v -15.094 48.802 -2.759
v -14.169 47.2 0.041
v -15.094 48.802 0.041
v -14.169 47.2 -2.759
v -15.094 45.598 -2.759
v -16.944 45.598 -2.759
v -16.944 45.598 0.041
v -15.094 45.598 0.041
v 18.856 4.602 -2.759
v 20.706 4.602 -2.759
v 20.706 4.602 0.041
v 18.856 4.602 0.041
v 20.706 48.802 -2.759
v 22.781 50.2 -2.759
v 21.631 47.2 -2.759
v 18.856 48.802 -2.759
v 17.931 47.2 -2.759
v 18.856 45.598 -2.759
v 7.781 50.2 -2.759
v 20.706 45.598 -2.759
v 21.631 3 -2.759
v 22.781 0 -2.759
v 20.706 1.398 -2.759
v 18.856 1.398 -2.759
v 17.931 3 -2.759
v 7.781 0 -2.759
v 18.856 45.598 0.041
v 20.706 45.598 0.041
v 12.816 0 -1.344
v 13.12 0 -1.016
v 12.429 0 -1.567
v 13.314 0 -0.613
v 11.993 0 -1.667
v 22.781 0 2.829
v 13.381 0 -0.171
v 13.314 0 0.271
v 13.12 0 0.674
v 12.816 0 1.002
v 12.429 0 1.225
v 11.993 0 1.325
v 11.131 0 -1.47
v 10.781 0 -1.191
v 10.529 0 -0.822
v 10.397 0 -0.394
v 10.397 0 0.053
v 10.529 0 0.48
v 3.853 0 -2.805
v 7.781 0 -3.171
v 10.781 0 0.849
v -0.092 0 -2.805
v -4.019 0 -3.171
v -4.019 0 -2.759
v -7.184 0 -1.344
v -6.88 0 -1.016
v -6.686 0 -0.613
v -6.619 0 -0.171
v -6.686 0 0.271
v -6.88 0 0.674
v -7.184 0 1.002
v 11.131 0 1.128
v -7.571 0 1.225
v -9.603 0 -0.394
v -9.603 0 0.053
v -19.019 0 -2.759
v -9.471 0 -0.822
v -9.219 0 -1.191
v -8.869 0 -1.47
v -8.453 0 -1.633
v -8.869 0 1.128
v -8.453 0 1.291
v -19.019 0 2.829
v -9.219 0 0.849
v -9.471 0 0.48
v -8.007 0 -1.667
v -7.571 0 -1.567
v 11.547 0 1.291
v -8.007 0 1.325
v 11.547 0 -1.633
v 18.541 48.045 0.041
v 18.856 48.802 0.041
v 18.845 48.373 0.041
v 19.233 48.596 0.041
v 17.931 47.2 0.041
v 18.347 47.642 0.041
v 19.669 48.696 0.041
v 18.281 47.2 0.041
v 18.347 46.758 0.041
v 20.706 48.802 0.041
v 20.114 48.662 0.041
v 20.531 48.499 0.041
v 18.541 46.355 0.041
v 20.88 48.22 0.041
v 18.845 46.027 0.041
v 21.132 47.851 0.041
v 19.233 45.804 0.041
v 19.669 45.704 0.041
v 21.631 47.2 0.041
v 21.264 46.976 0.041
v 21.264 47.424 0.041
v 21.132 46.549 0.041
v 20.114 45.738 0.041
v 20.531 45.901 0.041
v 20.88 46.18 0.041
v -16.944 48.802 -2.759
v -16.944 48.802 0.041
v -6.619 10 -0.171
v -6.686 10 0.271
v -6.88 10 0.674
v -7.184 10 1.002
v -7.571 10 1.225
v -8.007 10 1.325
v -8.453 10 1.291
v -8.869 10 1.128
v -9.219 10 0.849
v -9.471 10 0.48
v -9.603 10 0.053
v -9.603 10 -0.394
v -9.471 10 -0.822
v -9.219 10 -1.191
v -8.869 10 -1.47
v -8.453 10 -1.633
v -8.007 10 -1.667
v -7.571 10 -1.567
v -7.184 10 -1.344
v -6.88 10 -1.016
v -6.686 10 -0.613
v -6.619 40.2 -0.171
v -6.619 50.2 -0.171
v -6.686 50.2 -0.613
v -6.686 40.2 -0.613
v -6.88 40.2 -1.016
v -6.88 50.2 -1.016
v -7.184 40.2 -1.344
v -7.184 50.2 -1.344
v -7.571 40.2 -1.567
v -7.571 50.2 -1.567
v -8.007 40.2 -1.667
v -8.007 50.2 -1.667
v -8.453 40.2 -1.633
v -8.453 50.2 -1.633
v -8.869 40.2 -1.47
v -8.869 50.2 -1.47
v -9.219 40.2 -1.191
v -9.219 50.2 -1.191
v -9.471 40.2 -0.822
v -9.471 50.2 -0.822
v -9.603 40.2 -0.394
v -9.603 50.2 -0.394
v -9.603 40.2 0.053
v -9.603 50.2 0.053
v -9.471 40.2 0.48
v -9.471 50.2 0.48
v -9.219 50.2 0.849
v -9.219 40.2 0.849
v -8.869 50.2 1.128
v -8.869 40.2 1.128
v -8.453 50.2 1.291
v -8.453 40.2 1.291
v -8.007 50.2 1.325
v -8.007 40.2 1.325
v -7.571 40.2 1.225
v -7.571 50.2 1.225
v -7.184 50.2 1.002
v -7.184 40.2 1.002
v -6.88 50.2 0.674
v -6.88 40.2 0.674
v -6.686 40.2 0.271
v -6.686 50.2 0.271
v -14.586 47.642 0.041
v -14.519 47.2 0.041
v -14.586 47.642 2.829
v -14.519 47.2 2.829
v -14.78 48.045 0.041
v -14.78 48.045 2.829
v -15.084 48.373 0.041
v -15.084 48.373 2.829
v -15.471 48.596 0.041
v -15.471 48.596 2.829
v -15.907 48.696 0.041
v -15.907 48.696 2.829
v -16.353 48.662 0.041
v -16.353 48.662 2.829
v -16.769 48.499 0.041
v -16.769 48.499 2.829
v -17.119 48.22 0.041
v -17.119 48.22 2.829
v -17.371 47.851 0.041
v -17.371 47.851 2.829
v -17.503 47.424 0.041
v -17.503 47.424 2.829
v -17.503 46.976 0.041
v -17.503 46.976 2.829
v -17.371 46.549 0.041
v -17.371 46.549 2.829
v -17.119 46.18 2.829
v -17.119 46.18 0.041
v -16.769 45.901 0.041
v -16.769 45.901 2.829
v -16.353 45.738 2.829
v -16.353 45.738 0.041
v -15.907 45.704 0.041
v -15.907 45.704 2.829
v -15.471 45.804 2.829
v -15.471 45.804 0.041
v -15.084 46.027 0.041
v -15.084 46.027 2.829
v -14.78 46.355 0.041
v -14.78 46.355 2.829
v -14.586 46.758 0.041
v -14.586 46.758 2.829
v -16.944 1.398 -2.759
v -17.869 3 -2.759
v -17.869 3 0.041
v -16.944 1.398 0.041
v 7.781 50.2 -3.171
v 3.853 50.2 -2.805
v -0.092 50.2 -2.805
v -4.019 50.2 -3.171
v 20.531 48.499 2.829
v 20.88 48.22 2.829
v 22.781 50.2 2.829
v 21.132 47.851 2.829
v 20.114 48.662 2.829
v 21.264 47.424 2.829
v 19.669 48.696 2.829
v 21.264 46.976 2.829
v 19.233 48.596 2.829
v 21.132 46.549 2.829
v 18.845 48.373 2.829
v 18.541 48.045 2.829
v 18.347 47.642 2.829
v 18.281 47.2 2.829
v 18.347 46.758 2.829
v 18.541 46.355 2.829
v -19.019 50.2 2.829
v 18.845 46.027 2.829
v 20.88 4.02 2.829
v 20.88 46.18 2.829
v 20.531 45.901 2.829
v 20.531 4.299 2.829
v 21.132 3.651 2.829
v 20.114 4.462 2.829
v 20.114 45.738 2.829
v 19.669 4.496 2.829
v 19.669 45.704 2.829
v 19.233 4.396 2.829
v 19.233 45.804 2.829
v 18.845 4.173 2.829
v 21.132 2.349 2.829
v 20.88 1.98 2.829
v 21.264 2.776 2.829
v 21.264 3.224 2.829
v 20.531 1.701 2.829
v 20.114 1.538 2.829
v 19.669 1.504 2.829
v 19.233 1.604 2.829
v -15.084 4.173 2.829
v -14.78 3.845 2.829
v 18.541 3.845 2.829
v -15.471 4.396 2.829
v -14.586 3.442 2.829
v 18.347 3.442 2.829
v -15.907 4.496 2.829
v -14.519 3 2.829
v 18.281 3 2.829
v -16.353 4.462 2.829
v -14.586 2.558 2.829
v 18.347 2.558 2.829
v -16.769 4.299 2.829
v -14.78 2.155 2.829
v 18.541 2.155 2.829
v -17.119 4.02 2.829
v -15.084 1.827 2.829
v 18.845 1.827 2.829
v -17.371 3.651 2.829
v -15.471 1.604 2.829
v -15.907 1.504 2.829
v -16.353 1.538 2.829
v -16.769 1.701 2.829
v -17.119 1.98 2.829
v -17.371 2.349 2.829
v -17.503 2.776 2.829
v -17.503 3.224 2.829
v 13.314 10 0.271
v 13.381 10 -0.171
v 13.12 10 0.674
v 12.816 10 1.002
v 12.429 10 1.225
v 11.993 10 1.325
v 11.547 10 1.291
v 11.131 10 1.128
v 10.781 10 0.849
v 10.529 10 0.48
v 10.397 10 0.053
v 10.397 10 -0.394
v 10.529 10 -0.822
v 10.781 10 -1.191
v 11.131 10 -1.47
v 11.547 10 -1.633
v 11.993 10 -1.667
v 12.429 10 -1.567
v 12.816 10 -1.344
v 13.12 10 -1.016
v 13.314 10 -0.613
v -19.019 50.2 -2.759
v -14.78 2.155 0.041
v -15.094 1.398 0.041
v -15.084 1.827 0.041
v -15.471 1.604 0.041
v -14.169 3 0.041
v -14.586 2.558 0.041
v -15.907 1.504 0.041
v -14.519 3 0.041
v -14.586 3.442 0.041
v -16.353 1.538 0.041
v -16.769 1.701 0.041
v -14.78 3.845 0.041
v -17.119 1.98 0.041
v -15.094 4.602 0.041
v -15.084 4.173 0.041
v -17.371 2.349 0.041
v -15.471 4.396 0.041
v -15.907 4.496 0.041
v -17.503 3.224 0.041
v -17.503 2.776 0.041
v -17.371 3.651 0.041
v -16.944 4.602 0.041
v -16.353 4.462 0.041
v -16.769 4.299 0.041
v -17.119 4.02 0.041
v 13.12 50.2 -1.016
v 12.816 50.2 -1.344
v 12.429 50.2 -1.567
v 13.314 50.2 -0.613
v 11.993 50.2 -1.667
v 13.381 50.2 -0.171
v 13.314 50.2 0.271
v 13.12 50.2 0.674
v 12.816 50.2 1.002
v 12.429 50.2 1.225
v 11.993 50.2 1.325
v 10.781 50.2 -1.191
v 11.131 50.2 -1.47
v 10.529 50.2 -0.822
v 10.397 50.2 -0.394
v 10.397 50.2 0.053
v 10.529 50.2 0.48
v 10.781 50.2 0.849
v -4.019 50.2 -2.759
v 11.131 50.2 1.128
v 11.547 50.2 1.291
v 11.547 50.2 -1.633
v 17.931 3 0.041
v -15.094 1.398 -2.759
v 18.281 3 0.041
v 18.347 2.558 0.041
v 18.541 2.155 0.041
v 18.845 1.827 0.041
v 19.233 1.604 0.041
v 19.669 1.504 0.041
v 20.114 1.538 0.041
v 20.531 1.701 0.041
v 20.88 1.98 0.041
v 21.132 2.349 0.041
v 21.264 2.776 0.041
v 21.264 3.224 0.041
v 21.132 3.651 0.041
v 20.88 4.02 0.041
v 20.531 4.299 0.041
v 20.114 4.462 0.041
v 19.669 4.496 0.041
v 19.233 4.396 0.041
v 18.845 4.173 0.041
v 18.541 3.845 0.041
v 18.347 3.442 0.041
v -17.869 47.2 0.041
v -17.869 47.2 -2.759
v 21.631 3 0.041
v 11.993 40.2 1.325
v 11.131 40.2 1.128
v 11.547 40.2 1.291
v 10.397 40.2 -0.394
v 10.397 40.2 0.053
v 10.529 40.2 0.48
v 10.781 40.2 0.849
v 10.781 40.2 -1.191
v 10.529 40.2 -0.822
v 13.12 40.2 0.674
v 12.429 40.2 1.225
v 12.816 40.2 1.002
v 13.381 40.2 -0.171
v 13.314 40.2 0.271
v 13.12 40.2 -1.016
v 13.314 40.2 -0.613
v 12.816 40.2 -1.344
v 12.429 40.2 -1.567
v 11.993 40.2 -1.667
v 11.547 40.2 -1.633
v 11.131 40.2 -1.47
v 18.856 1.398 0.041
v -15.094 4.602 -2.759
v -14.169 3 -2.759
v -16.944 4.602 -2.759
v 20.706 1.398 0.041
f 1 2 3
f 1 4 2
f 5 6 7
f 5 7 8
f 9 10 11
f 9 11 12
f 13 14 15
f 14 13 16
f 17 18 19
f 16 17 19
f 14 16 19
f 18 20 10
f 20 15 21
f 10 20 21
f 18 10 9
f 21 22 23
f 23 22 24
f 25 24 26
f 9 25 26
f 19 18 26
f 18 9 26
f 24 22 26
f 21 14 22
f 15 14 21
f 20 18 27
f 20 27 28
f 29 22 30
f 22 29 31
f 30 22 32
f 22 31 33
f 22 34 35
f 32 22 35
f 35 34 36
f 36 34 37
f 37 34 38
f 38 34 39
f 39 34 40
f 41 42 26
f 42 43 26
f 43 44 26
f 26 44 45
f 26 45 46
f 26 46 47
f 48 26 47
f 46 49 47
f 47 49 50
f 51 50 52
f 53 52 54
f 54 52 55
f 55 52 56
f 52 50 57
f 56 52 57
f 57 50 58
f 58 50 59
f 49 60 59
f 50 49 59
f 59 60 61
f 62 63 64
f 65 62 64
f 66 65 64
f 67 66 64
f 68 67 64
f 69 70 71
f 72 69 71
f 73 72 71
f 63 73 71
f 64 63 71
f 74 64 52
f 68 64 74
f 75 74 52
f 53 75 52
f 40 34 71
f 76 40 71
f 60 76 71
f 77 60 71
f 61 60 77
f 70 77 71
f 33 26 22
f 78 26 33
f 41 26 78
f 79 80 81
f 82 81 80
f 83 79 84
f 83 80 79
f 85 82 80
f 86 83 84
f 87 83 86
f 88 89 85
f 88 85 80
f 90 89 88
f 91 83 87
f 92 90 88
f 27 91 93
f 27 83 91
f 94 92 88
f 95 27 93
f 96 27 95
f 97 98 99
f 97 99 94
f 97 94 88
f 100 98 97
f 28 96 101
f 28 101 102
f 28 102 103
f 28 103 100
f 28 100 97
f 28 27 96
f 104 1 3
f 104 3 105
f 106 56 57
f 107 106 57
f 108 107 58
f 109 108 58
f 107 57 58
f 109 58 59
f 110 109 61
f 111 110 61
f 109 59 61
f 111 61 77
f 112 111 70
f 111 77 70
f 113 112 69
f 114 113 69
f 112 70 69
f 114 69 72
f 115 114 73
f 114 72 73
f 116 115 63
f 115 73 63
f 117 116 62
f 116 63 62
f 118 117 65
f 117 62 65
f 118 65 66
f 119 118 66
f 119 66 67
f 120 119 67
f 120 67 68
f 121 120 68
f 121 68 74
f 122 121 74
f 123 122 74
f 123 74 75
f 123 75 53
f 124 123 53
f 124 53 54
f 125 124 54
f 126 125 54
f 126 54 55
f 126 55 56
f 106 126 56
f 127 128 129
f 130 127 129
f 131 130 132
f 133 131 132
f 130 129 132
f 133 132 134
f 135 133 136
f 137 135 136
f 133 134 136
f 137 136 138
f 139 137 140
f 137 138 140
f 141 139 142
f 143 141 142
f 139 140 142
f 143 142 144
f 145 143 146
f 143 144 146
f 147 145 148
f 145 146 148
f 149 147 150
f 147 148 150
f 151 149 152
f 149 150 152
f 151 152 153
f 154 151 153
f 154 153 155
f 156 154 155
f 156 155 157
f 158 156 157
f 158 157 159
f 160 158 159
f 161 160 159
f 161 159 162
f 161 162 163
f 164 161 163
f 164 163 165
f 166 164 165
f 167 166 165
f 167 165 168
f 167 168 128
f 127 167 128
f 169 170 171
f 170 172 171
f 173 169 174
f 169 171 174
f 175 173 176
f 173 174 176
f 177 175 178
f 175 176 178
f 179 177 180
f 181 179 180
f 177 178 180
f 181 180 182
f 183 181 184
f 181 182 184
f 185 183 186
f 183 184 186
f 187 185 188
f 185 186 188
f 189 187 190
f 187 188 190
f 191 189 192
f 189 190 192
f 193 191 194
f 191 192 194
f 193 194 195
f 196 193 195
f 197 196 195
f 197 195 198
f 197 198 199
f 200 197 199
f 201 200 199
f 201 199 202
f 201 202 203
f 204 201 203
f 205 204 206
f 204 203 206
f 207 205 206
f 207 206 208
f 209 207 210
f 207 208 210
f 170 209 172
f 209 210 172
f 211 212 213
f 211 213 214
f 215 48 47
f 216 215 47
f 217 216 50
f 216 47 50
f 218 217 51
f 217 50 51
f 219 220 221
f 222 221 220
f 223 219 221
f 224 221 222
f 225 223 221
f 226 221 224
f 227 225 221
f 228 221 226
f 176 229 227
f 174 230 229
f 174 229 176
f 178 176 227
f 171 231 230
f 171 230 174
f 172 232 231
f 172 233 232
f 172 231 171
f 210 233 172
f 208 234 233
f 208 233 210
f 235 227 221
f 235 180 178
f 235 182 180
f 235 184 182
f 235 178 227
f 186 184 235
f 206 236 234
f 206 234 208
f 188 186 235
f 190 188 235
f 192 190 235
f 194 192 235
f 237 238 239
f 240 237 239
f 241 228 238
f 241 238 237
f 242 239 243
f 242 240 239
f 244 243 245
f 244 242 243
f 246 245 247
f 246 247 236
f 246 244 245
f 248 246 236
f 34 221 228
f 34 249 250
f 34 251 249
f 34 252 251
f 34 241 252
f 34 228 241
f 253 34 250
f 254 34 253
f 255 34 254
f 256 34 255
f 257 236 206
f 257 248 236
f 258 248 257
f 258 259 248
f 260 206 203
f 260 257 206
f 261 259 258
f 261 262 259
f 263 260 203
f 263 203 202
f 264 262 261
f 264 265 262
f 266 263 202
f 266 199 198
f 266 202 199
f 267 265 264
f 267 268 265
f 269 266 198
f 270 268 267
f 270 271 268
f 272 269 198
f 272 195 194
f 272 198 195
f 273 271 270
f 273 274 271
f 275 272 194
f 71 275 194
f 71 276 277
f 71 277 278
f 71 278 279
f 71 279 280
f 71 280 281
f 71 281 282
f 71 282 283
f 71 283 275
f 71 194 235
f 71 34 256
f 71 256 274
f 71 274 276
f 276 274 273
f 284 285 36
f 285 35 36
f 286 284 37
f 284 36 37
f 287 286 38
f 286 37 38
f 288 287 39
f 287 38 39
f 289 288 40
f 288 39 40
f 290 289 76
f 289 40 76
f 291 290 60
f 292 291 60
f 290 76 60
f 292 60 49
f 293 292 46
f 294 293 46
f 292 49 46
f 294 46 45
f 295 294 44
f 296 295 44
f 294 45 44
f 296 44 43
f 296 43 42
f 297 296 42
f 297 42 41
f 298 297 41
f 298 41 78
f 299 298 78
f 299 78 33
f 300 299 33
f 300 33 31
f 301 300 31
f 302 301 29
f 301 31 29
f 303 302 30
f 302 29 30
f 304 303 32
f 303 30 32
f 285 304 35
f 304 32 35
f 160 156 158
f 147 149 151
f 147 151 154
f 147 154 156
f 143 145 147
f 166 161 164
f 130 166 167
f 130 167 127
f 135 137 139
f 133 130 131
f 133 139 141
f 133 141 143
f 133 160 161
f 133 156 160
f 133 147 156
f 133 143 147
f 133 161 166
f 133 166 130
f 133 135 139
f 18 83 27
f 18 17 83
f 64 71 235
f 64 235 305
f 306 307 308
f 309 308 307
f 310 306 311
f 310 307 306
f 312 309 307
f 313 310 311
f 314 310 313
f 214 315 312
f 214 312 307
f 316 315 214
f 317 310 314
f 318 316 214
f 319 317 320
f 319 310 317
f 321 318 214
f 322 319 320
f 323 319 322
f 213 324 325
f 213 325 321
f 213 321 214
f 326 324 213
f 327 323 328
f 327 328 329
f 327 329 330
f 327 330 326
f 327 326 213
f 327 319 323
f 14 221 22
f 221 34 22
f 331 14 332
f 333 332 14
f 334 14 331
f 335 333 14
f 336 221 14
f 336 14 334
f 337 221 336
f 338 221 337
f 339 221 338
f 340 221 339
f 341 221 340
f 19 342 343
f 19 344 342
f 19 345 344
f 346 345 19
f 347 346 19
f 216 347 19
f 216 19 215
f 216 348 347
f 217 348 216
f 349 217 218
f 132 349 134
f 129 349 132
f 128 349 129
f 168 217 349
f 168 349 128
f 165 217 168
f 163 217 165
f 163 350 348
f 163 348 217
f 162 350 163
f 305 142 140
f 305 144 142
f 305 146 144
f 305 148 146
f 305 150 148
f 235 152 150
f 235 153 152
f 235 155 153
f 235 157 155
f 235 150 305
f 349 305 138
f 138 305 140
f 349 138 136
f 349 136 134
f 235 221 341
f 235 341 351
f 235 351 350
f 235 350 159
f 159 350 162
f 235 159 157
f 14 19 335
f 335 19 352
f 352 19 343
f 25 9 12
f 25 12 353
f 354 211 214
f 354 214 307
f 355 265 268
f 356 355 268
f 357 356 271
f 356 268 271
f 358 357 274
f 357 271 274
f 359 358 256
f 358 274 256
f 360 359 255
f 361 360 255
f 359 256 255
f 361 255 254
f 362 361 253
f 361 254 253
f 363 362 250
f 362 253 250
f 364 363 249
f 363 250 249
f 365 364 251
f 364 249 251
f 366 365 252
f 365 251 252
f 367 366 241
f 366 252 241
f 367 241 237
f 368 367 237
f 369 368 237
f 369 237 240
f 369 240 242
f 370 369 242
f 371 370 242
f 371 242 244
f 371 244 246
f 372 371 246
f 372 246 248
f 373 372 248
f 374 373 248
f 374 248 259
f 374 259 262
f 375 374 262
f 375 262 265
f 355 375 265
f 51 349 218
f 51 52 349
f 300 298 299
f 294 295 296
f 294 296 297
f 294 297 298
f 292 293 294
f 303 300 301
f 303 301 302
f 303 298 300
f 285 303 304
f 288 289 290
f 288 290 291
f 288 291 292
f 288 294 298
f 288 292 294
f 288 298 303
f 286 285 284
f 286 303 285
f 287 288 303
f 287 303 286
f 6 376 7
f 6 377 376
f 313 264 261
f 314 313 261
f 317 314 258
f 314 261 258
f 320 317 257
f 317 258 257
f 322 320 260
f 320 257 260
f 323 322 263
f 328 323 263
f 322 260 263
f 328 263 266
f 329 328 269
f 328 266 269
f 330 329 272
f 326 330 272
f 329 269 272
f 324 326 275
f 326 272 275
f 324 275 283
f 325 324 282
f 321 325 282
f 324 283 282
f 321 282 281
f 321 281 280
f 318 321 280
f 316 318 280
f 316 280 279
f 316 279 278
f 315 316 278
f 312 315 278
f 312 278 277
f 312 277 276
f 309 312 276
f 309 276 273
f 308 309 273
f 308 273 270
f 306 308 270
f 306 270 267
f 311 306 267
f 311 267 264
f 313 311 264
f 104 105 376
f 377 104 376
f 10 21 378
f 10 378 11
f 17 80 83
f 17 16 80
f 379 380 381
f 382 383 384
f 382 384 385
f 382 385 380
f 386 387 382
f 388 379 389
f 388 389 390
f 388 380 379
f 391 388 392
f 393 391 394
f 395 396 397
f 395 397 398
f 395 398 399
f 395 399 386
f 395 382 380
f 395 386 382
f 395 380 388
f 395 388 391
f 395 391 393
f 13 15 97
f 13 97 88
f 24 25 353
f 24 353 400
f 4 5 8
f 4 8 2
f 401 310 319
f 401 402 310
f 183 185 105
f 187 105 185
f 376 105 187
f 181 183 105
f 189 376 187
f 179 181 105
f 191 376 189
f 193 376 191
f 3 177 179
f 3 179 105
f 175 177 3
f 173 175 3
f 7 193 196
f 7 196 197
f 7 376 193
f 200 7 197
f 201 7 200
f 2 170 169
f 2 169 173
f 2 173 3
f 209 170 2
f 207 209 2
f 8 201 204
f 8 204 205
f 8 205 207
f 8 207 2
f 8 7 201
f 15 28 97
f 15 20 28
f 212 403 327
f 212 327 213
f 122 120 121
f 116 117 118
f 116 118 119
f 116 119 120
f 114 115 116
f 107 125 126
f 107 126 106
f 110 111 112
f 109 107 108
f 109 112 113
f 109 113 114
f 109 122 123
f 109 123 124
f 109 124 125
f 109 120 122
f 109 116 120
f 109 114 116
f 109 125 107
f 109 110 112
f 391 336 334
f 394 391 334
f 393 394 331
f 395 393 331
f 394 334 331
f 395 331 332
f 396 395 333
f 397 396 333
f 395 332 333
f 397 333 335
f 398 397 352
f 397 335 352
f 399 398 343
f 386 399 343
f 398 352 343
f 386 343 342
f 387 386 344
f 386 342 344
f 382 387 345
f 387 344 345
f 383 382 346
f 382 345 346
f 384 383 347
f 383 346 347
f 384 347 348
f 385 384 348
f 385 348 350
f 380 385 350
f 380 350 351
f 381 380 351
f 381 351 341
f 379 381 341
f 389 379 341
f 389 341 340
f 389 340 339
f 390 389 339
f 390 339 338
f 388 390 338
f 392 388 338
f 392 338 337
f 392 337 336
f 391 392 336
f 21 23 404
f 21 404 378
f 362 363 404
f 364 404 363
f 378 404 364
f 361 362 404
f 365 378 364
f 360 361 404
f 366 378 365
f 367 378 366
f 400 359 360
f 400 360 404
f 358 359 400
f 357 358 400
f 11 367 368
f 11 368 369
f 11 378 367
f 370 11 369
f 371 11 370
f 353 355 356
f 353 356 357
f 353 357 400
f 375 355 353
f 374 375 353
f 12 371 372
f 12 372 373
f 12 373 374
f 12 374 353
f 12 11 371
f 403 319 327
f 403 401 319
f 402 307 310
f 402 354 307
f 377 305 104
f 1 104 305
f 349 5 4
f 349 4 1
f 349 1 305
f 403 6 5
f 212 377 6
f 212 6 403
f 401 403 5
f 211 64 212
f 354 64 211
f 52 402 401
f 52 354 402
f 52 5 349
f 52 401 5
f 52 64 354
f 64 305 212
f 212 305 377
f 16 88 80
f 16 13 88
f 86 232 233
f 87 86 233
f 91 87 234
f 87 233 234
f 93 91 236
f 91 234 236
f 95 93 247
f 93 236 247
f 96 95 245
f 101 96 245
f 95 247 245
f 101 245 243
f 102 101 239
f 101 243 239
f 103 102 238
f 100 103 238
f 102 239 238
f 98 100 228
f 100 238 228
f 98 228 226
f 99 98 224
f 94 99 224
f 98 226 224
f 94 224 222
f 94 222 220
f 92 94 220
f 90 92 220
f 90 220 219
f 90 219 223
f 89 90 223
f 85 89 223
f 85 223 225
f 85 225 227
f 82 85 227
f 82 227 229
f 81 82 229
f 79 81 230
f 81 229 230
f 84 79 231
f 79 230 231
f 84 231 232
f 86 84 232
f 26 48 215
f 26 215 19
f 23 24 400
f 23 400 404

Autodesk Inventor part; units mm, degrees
ref_plane "YZ Plane" through (0, 0, 0) normal (1, 0, 0) x (0, 1, 0)
sketch "Эскиз1" plane through (0, 0, 0) normal (0, 1, 0) x (-1, 0, 0)
  arc A0 (4.0194, -3.1709) -> (-7.7806, -3.1709) centre (-1.8806, -45.2594) ccw
  line L0 (-7.7806, -3.1709) -> (-7.7806, 2.8291)
  line L1 (-7.7806, 2.8291) -> (4.0194, 2.8291)
  line L2 (4.0194, 2.8291) -> (4.0194, -3.1709)
  point P0 (0, -39)
  dimension "d1" = 6
  dimension "d12" = 11.8
extrude "Выдавливание1" add sketch "Эскиз1" along normal blind 50.2
sketch "Эскиз4" plane through (0, 0, 0) normal (0, -1, 0) x (1, 0, 0)
  arc A0 (7.7806, -3.1709) -> (-4.0194, -3.1709) centre (1.8806, -45.2594) ccw projected
  line L0 (1.8806, -2.7594) -> (-4.0194, -2.7594)
  line L1 (-4.0194, -3.1709) -> (-4.0194, 2.8291) projected
  line L2 (-4.0194, 2.8291) -> (-19.0194, 2.8291)
  line L3 (-19.0194, 2.8291) -> (-19.0194, -2.7594)
  line L4 (-19.0194, -2.7594) -> (-4.0194, -2.7594)
  line L5 (-4.0194, -2.7594) -> (-4.0194, 2.8291)
  line L6 (7.7806, 2.8291) -> (7.7806, -3.1709) projected
  line L7 (7.7806, 2.8291) -> (22.7806, 2.8291)
  line L8 (22.7806, 2.8291) -> (22.7806, -2.7594)
  line L9 (22.7806, -2.7594) -> (7.7806, -2.7594)
  line L10 (7.7806, -2.7594) -> (7.7806, 2.8291)
  point P0 (0, 0)
  dimension "d13" = 15
  dimension "d16" = 15
extrude "Выдавливание4" add sketch "Эскиз4" against normal up to surface (50.2 mm away) contours L4 L3 L2 L1 | L6 L7 L8 L9
sketch "Эскиз5" plane through (0, 0, 0) normal (0, -1, 0) x (1, 0, 0)
  line L0 (22.7806, 2.8291) -> (-19.0194, 2.8291) projected
  line L1 (1.8806, 2.8291) -> (1.8806, -0.1709)
  line L2 (1.8806, -0.1709) -> (-8.1194, -0.1709)
  line L3 (-8.1194, -0.1709) -> (11.8806, -0.1709)
  circle A0 centre (-8.1194, -0.1709) radius 1.5
  circle A1 centre (11.8806, -0.1709) radius 1.5
  point P0 (0, 0)
  dimension "d17" = 3
  dimension "d18" = 10
  dimension "d19" = 20
  dimension "d20" = 3
  dimension "d21" = 3
extrude "Выдавливание5" cut sketch "Эскиз5" against normal blind 10
sketch "Эскиз6" plane through (0, 50.2, 0) normal (0, 1, 0) x (1, 0, 0)
  circle A0 centre (-8.1194, 0.1709) radius 1.5 projected
  circle A1 centre (-8.1194, 0.1709) radius 1.5
  circle A2 centre (11.8806, 0.1709) radius 1.5 projected
  circle A3 centre (11.8806, 0.1709) radius 1.5
  point P0 (0, 0)
extrude "Выдавливание6" cut sketch "Эскиз6" against normal blind 10
sketch "Эскиз7" plane through (-19.0194, 0, 2.8291) normal (0, 0, 1) x (1, 0, 0)
  line L0 (0, 0) -> (0, 50.2) projected
  line L1 (0, 0) -> (3, 0)
  line L2 (3, 0) -> (3, 3)
  line L3 (3, 3) -> (0, 3)
  line L4 (0, 3) -> (0, 0)
  circle A0 centre (3, 3) radius 1.5
  point P0 (19.0194, 0)
  dimension "d26" = 3
  dimension "d27" = 3
  dimension "d28" = 3
extrude "Выдавливание7" cut sketch "Эскиз7" against normal blind 10 contours A0 L2 L3 | L3 L2 A0
sketch "Эскиз8" plane through (-4.0194, 0, -2.7594) normal (0, 0, -1) x (-1, 0, 0)
  circle A0 centre (12, 3) radius 1.5 projected
  line L0 (13.85, 3) -> (12.925, 1.3979)
  line L1 (12.925, 1.3979) -> (11.075, 1.3979)
  line L2 (11.075, 1.3979) -> (10.15, 3)
  line L3 (10.15, 3) -> (11.075, 4.6021)
  line L4 (11.075, 4.6021) -> (12.925, 4.6021)
  line L5 (12.925, 4.6021) -> (13.85, 3)
  point P0 (-4.0194, 0)
  dimension "d31" = 3.7
extrude "Выдавливание8" cut sketch "Эскиз8" against normal blind 2.8 contours A0 | L0 L1 L2 L3 L4 L5
ref_plane "РабПлоскость2" through (1.8806, 0, -2.7594) normal (-1, 0, 0) x (0, 0, 1)
ref_plane "РабПлоскость3" through (-4.0194, 25.1, -3.1709) normal (0, -1, 0) x (1, 0, 0)
mirror "Зеркальное отражение2" about plane through (1.8806, 0, -2.7594) normal (-1, 0, 0) of "Выдавливание8", "Выдавливание7"
mirror "Зеркальное отражение3" about plane through (-4.0194, 25.1, -3.1709) normal (0, -1, 0) of "Выдавливание8", "Выдавливание7", "Зеркальное отражение2"
sketch "Эскиз9" plane through (-19.0194, 0, 2.8291) normal (0, 0, 1) x (1, 0, 0)
  circle A0 centre (38.8, 47.2) radius 1.5 projected
  circle A1 centre (3, 47.2) radius 1.5 projected
  circle A2 centre (38.8, 3) radius 1.5 projected
  circle A3 centre (3, 3) radius 1.5 projected
  line L0 (41.8, 0) -> (0, 0) projected
  line L1 (41.8, 0) -> (41.8, 50.2) projected
  line L2 (41.8, 50.2) -> (0, 50.2) projected
  line L3 (0, 0) -> (0, 50.2) projected
  point P0 (19.0194, 0)
properties part number "joint3_rot_con" material "Пластик АБС"
